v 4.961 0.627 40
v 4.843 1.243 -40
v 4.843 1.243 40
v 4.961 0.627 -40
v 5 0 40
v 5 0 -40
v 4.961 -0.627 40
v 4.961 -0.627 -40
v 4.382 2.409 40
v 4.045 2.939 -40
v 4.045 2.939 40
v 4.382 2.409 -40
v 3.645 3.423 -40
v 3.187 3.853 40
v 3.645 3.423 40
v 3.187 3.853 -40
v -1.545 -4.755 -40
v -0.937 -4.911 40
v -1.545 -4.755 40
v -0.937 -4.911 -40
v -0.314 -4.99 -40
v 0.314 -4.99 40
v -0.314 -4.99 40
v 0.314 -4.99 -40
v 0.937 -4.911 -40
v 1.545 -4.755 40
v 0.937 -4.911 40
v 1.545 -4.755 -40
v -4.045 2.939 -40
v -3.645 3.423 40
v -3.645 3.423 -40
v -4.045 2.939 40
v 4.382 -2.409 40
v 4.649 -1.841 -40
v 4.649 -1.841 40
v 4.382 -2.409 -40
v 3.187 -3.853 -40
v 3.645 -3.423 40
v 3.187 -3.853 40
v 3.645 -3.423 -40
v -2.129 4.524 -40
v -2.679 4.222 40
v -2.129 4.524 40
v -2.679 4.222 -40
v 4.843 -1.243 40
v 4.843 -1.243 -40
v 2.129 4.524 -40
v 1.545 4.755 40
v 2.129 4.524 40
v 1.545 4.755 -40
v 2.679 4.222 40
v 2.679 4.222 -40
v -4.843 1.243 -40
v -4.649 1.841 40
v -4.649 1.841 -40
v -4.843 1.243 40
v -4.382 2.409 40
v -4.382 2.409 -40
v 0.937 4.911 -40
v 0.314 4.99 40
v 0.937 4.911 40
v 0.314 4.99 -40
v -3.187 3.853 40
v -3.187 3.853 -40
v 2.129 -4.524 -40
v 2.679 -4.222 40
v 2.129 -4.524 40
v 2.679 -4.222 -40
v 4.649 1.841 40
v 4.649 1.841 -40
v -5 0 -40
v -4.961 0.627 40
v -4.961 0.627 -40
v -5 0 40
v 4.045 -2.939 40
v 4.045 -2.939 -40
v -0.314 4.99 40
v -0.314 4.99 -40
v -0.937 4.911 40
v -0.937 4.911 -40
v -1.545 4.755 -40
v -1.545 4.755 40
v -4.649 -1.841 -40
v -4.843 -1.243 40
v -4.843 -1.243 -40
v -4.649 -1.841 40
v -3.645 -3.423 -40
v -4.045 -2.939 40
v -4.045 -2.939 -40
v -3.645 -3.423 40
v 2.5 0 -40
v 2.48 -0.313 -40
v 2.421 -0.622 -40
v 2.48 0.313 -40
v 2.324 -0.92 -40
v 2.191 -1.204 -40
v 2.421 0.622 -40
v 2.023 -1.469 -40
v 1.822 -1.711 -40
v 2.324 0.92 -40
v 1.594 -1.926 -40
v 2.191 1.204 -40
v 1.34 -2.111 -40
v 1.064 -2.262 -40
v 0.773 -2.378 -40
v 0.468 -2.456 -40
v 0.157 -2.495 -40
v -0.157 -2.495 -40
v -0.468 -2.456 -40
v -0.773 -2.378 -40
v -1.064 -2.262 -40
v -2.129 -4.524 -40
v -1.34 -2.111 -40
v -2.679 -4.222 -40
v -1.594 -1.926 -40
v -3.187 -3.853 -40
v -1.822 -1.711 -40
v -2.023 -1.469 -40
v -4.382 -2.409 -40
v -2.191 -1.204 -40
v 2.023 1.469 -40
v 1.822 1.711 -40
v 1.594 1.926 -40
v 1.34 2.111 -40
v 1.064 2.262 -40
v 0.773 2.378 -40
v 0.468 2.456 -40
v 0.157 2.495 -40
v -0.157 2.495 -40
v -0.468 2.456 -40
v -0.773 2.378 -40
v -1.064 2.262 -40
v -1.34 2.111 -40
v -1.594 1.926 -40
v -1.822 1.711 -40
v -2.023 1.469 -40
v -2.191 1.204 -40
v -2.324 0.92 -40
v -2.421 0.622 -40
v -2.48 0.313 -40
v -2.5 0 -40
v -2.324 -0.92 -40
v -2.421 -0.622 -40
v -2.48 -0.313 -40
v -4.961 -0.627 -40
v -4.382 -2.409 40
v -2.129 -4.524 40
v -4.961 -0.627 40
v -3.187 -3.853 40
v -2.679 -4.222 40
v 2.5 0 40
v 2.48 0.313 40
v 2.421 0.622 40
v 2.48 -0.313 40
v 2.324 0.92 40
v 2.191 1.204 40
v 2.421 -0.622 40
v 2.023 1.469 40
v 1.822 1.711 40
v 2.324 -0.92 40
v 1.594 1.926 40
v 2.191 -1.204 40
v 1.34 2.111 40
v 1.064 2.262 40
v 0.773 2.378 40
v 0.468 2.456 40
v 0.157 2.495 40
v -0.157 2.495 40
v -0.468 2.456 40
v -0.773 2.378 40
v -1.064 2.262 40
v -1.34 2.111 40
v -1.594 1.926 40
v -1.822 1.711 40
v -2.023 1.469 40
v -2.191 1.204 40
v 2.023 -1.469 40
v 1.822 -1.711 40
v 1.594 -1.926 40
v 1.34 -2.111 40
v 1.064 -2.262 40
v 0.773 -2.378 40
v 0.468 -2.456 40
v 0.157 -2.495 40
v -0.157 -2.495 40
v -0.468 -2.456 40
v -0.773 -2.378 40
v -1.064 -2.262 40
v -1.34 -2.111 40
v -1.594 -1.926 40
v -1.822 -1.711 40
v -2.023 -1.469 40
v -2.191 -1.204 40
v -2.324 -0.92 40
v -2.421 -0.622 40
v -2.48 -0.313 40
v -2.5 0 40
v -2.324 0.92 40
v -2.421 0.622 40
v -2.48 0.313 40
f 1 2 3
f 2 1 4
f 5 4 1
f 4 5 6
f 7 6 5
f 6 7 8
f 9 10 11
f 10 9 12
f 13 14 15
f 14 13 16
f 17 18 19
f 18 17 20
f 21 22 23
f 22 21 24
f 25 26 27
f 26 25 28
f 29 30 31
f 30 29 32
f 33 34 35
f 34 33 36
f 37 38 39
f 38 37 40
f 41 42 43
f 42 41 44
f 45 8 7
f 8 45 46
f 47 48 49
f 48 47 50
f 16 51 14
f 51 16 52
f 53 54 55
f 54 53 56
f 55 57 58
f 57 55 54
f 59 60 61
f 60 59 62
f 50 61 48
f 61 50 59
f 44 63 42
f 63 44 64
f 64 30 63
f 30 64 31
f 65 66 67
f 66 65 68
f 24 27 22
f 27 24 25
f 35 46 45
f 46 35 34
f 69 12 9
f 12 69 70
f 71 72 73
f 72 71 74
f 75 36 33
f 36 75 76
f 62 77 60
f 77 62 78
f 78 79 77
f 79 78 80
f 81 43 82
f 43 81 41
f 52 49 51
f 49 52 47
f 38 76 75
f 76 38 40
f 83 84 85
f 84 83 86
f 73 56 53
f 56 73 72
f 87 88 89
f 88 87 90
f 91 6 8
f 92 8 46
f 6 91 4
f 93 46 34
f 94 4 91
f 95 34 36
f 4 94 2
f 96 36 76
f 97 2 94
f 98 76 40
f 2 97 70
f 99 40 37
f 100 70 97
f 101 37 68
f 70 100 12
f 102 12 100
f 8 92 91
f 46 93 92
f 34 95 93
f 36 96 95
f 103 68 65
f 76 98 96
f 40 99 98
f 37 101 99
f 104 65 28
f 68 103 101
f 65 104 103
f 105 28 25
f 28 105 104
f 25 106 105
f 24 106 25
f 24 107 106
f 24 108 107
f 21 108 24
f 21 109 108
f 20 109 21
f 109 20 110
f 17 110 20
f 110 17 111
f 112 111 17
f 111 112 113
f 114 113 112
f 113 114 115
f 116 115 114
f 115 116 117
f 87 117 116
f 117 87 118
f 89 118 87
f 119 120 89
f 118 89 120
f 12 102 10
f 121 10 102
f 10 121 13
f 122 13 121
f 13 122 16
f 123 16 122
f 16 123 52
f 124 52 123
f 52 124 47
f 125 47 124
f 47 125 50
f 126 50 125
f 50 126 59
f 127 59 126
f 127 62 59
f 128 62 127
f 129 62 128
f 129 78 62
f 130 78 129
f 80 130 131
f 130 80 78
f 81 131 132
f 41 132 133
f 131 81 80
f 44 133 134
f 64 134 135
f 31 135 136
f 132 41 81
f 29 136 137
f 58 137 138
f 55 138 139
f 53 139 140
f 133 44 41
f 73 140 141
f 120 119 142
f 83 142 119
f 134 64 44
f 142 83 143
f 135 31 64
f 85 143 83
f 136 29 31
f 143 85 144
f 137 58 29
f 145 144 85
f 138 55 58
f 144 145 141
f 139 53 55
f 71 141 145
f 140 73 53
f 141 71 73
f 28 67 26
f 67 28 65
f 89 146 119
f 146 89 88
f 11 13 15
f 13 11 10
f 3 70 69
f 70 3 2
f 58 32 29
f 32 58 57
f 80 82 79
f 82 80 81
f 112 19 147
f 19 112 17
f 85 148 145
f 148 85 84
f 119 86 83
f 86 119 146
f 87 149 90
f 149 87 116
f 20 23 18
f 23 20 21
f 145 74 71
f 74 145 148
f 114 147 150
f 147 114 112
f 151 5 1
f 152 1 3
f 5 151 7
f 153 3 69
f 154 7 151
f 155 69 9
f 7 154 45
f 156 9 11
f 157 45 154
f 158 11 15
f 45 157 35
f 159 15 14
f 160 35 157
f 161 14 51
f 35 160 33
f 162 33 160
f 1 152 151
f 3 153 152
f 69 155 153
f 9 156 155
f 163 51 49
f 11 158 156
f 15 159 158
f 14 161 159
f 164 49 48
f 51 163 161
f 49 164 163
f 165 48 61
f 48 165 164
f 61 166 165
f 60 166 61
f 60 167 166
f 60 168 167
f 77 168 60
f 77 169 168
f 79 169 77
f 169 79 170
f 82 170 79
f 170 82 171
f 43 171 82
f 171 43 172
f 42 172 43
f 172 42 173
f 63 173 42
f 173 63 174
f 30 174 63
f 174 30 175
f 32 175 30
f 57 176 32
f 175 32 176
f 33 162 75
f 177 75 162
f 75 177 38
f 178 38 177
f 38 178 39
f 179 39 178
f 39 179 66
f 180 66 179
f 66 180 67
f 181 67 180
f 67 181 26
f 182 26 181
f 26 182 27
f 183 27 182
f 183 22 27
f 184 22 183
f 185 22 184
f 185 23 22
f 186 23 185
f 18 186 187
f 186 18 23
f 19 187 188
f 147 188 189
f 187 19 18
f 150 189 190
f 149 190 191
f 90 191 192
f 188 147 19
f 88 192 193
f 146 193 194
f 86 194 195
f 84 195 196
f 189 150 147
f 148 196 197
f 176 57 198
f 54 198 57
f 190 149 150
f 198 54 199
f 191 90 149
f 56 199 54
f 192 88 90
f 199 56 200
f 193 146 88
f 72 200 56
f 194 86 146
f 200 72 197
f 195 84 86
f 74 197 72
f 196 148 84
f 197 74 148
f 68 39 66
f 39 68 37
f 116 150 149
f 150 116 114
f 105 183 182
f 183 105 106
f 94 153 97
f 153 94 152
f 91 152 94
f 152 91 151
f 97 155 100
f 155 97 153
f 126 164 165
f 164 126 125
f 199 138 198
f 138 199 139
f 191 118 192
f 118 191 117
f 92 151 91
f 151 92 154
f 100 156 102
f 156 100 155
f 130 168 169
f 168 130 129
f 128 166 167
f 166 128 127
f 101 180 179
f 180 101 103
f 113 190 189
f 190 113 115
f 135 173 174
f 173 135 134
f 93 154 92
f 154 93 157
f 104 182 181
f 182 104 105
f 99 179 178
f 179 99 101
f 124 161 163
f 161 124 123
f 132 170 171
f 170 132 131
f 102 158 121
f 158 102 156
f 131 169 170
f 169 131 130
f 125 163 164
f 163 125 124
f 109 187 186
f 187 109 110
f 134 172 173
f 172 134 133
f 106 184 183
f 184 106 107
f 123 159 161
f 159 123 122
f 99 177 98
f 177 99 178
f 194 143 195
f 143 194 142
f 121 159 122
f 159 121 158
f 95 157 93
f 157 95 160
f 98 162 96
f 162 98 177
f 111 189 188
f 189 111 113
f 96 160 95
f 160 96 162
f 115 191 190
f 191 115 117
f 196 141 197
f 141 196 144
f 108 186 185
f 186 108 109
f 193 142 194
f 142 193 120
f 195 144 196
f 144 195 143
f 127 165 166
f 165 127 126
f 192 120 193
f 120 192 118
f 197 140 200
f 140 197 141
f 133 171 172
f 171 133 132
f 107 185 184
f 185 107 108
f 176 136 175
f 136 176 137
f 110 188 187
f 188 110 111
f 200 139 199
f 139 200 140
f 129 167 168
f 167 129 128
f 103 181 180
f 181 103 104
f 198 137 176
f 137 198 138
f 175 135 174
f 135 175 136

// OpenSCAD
$fn = 50;


difference() {
	union() {
		translate(v = [0, 0, -40.0000000000]) {
			cylinder(h = 80, r = 5.0000000000);
		}
	}
	union() {
		translate(v = [0, 0, -100.0000000000]) {
			cylinder(h = 200, r = 2.5000000000);
		}
	}
}
